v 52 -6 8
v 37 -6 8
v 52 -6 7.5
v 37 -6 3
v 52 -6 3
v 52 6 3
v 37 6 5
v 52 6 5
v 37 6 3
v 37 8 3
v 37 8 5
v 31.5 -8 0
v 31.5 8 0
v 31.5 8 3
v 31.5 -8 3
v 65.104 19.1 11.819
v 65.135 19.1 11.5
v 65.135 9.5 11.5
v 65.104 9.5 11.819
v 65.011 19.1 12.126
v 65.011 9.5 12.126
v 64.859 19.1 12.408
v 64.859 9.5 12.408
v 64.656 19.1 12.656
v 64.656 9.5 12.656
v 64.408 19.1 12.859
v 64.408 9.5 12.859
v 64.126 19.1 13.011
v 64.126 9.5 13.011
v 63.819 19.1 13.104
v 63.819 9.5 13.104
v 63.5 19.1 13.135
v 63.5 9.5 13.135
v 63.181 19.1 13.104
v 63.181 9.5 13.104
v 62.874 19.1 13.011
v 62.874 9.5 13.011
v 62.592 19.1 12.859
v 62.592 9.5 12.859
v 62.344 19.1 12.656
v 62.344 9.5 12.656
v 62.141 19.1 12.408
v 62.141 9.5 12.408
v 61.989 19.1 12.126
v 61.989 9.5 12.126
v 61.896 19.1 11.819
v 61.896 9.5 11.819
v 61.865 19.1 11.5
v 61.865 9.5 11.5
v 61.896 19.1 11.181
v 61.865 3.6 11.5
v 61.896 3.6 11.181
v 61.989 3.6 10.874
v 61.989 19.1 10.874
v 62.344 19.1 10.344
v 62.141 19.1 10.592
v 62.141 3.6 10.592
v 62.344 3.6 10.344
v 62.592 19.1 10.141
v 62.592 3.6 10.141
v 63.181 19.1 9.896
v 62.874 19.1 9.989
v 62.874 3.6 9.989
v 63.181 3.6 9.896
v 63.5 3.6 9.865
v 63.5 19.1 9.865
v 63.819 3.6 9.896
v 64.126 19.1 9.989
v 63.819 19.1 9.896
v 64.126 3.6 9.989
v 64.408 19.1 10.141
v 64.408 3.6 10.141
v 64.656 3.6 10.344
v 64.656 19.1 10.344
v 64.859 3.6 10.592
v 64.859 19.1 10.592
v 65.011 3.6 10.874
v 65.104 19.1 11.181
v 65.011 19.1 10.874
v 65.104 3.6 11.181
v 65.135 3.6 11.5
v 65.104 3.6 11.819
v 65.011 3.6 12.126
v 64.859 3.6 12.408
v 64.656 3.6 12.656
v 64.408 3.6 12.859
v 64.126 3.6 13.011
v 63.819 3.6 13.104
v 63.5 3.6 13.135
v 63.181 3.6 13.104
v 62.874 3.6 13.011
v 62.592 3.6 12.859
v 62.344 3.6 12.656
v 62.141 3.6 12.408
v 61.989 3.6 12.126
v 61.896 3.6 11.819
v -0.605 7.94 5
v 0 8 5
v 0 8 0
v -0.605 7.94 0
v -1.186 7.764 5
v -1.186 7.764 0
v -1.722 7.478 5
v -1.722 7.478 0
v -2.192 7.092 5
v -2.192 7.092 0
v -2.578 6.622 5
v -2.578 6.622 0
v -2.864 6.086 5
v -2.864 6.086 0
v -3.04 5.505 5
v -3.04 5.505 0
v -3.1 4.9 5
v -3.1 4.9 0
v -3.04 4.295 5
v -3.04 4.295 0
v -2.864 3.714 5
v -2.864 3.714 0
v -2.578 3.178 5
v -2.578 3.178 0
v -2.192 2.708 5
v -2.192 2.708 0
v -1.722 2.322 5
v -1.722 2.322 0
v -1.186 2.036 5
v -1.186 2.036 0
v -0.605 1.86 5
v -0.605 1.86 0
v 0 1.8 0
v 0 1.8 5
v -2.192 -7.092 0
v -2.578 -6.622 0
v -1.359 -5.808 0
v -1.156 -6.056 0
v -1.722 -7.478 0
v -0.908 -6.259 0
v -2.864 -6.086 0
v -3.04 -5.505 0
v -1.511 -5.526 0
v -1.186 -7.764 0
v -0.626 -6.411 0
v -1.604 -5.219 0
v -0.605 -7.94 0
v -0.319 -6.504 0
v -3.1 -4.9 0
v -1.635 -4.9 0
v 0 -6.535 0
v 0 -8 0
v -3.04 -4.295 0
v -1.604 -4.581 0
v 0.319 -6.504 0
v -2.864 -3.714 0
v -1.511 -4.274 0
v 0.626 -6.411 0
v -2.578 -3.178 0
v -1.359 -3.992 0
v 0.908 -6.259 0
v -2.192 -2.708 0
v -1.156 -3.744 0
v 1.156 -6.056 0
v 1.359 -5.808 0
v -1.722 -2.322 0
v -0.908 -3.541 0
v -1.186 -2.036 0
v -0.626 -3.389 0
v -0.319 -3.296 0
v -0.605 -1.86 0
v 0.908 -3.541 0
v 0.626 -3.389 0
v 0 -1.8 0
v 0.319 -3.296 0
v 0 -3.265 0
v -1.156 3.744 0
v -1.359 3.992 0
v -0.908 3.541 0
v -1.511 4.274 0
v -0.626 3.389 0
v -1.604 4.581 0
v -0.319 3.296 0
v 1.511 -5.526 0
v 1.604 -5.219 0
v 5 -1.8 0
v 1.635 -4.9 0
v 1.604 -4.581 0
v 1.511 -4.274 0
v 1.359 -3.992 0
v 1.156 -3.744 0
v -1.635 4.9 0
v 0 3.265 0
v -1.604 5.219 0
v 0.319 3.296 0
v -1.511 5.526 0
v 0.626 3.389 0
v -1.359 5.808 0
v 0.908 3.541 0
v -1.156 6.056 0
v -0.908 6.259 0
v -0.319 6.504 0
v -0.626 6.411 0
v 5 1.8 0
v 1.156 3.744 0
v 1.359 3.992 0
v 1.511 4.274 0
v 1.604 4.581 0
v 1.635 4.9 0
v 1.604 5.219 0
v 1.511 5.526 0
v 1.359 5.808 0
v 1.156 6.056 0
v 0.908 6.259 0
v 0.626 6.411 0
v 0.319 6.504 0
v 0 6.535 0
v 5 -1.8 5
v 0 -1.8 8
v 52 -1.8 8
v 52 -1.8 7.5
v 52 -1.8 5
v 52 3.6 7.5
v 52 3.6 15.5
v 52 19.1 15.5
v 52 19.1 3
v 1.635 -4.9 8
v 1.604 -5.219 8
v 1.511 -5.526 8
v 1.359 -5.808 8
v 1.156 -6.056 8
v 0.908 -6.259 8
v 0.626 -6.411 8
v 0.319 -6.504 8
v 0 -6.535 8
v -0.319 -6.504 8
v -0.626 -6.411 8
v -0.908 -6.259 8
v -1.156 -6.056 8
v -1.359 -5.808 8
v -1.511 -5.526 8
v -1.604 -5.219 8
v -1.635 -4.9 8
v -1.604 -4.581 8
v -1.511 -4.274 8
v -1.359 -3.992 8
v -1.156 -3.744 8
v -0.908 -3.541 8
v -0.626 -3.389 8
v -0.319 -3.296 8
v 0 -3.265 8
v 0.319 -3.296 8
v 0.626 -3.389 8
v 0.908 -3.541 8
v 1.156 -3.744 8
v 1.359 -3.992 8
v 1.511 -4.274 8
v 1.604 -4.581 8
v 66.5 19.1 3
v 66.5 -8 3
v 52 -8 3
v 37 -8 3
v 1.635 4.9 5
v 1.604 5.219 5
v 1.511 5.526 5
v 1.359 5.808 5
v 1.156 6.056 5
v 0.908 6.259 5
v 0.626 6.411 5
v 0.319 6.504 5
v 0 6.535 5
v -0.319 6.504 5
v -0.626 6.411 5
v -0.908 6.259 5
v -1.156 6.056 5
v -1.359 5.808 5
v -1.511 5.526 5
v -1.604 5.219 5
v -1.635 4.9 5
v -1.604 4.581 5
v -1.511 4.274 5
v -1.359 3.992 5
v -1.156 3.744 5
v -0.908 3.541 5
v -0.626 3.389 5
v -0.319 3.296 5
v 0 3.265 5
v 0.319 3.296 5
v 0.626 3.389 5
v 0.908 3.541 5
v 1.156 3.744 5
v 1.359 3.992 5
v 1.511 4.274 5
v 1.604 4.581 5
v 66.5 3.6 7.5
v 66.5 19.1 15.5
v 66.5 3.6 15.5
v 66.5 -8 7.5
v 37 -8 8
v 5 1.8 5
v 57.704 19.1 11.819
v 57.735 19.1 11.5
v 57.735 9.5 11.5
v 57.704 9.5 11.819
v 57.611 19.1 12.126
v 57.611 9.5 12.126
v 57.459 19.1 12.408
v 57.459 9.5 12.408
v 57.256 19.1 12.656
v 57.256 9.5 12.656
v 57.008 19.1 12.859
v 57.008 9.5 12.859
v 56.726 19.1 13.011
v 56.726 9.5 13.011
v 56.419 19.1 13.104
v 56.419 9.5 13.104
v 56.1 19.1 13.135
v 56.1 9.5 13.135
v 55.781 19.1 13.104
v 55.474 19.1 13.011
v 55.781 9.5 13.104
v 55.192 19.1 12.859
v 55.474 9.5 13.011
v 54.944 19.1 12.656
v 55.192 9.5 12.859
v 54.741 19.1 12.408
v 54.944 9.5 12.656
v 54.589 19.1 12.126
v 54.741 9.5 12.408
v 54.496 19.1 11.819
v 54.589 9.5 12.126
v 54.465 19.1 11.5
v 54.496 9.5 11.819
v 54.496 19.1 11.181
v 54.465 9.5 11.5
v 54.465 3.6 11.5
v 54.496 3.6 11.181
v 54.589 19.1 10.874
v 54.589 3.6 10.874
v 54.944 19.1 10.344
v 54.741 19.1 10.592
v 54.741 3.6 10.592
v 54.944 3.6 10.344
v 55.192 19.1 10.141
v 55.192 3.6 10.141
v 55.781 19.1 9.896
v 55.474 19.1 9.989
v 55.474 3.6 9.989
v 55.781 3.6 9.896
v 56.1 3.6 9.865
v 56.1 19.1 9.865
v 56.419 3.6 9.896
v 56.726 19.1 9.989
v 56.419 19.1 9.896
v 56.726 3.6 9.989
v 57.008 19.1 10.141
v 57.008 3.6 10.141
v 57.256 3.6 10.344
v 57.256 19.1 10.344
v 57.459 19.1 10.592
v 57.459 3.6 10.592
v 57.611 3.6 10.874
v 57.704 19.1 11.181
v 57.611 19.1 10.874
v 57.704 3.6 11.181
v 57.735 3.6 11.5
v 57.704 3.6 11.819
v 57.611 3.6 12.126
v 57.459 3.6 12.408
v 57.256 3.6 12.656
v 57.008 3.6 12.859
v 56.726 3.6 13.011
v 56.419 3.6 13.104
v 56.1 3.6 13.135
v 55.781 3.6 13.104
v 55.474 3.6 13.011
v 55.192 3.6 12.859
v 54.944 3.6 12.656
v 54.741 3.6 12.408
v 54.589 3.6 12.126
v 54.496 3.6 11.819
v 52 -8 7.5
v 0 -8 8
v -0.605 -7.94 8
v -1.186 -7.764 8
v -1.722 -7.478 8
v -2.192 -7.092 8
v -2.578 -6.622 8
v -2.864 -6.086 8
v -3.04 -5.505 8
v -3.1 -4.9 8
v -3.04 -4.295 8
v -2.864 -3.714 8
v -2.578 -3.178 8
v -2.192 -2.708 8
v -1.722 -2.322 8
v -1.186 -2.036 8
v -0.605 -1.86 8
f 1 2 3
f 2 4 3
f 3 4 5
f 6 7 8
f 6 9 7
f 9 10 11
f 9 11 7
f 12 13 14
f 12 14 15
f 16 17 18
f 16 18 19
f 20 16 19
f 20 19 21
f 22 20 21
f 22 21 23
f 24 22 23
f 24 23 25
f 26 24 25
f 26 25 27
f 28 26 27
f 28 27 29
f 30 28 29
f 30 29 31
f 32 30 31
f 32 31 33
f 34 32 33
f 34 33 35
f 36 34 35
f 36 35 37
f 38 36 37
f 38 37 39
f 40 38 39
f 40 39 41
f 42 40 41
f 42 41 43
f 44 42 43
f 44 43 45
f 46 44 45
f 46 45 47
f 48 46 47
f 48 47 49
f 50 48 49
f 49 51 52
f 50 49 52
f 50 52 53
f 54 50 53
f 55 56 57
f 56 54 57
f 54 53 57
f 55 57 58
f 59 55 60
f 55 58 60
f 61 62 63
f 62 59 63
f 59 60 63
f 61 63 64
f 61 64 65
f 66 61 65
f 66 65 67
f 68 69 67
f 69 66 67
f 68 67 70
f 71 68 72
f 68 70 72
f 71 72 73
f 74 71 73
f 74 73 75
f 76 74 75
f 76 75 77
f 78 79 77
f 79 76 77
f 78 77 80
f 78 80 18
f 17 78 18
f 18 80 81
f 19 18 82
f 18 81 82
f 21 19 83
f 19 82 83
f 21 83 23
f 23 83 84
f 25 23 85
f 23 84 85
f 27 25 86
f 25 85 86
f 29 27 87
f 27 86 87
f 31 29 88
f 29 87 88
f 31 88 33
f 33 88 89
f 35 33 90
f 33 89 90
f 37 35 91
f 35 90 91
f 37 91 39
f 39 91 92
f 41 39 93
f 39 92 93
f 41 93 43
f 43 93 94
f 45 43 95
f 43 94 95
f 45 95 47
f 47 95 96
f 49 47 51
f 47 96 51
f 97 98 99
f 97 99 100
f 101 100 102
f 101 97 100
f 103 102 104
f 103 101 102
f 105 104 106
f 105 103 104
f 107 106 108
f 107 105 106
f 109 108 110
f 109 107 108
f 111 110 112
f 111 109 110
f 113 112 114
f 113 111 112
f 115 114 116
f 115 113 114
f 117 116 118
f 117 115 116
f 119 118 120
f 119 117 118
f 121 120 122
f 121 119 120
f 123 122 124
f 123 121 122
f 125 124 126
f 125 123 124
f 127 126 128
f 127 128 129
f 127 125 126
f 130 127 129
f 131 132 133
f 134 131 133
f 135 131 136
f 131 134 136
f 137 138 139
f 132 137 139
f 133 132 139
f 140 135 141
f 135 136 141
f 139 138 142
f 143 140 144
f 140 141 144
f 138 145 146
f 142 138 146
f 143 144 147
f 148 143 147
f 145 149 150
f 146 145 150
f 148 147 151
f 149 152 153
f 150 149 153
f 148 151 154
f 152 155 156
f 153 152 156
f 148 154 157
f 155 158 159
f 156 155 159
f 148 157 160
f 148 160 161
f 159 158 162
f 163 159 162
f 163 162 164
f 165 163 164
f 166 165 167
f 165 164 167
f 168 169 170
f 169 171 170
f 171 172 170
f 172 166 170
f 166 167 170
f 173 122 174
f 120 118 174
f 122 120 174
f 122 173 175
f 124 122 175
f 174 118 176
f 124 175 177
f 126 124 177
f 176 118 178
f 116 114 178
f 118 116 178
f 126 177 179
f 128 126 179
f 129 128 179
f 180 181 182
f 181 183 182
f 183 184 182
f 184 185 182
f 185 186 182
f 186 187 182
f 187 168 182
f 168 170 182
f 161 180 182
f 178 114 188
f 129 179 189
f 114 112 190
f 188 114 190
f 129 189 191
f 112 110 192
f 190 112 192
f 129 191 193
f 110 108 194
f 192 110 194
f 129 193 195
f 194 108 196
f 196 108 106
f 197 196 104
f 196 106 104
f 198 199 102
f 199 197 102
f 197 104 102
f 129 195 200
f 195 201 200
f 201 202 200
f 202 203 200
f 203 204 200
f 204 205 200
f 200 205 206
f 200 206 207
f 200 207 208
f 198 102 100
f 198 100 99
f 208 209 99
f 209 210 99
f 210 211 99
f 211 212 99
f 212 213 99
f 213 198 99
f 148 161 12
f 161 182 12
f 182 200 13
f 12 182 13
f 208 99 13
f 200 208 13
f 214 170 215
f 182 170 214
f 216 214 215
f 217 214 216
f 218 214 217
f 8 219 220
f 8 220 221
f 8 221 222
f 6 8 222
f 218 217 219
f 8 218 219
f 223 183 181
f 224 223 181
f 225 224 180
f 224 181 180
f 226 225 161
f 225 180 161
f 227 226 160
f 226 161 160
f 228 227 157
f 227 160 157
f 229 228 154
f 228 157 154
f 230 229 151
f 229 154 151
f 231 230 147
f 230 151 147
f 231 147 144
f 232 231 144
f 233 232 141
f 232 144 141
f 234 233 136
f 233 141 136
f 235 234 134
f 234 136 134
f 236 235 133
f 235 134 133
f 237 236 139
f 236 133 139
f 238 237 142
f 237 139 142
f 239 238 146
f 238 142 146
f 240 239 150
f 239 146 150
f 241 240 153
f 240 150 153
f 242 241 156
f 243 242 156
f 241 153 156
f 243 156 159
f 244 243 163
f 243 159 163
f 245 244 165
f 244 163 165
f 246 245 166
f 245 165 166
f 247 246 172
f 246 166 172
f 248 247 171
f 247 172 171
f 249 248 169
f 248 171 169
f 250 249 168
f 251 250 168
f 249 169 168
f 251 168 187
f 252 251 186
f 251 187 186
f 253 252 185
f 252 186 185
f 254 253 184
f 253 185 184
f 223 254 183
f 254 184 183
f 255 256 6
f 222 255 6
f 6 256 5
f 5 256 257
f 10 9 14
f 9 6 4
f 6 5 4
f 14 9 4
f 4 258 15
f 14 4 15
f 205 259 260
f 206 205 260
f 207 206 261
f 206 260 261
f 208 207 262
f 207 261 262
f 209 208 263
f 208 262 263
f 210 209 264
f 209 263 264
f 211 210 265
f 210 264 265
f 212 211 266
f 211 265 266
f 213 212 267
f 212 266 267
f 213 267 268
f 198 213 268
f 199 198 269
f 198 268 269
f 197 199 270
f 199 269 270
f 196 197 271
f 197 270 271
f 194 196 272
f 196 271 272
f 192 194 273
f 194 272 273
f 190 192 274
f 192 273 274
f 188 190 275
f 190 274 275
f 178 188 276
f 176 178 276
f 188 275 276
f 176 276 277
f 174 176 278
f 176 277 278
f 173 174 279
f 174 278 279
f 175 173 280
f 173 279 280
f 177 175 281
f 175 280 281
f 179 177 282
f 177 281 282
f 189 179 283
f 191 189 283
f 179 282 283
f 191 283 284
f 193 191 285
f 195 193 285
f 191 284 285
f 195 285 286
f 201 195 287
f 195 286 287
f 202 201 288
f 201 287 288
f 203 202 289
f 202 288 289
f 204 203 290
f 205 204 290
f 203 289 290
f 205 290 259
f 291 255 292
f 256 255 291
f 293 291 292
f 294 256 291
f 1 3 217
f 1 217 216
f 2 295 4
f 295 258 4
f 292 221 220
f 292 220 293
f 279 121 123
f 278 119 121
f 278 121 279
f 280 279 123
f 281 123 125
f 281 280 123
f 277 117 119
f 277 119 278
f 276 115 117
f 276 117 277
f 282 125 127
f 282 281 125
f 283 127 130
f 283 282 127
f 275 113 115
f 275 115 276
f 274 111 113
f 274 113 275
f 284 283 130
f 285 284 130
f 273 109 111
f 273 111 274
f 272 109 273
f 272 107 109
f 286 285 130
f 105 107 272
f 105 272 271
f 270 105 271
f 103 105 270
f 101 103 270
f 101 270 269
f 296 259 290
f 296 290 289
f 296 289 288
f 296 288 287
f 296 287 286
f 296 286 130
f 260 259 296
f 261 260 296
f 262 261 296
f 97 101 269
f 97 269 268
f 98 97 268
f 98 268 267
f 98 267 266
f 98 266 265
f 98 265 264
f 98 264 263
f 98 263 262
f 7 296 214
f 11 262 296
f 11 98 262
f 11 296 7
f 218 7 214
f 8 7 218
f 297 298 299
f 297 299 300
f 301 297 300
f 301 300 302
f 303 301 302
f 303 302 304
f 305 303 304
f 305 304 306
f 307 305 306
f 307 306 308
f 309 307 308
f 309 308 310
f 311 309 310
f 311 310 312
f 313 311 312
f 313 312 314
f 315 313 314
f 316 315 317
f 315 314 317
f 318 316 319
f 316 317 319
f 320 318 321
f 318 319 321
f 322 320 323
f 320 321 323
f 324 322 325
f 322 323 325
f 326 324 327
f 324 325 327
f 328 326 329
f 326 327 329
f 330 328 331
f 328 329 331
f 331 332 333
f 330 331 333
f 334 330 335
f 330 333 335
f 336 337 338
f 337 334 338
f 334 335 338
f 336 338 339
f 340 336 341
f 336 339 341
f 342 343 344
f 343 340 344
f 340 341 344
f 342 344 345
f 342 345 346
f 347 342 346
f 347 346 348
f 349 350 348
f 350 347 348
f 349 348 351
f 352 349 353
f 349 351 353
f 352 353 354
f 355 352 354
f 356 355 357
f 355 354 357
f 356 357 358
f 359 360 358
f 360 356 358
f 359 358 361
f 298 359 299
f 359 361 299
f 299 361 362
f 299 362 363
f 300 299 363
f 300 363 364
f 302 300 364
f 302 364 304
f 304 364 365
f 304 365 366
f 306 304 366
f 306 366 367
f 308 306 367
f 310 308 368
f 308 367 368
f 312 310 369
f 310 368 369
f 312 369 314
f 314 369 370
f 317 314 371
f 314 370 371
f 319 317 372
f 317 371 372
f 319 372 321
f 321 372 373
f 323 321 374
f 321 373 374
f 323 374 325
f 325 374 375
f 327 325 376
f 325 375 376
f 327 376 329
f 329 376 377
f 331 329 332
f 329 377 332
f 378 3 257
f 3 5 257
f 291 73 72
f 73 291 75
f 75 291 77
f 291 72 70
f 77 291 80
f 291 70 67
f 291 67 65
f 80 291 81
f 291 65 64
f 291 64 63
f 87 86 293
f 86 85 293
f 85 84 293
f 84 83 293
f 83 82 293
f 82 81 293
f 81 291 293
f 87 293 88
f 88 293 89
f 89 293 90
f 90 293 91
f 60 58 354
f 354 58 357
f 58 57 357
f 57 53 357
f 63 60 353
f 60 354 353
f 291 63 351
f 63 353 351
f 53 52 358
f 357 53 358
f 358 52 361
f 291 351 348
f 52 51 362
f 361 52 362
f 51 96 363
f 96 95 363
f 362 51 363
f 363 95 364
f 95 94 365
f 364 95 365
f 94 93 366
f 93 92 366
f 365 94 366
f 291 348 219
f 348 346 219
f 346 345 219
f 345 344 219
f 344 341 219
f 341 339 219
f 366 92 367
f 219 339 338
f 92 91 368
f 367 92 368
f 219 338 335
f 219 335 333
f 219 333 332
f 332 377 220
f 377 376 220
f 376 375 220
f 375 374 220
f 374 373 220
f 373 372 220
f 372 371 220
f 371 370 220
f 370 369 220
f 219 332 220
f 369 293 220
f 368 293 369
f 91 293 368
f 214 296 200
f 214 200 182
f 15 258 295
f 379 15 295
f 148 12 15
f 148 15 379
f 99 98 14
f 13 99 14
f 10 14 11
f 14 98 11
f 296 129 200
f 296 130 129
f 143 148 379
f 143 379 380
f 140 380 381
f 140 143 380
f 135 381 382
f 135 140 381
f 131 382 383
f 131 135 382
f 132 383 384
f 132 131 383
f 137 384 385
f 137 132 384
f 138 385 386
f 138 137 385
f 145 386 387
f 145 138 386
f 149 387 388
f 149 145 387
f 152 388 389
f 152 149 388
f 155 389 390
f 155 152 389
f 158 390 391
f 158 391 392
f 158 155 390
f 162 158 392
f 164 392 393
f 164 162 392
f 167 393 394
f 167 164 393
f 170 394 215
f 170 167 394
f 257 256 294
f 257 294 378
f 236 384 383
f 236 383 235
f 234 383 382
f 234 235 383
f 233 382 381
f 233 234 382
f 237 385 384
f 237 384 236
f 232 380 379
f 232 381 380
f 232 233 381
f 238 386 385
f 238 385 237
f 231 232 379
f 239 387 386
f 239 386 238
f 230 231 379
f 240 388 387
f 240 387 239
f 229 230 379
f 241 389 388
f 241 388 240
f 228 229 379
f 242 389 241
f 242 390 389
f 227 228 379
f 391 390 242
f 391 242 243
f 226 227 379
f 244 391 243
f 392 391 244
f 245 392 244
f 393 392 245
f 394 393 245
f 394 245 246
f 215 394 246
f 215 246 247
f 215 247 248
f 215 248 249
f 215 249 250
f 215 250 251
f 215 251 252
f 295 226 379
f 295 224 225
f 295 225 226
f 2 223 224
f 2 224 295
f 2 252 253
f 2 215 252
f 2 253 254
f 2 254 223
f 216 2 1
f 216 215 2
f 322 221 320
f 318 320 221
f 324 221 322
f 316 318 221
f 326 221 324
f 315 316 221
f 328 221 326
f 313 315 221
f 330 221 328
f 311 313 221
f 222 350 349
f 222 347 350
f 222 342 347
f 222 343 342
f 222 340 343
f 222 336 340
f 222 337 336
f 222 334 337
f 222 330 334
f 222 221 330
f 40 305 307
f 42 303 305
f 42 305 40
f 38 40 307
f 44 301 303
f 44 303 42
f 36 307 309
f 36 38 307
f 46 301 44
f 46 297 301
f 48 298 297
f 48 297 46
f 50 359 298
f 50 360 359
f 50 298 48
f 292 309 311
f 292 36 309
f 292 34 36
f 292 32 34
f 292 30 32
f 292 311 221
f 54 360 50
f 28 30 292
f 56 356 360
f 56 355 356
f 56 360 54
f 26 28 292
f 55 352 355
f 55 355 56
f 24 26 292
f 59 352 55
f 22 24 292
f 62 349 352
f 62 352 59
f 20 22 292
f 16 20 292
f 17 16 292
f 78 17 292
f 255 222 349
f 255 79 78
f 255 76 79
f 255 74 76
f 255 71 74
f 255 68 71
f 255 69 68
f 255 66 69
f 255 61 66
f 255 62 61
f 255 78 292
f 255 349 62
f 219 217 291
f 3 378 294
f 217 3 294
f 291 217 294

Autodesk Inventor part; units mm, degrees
ref_plane "YZ Plane" through (0, 0, 0) normal (1, 0, 0) x (0, 1, 0)
ref_plane "XZ Plane" through (0, 0, 0) normal (0, 1, 0) x (-1, 0, 0)
sketch "スケッチ1" plane through (0, 0, 0) normal (0, 0, 1) x (1, 0, 0)
  line L0 (-3, 8) -> (3, 8)
  line L1 (3, 8) -> (3, -8)
  line L2 (3, -8) -> (-3, -8)
  line L3 (-3, -8) -> (-3, 8)
  line L4 (-3, 8) -> (3, -8) construction
  line L5 (3, 8) -> (-3, -8) construction
  line L6 (0, 8) -> (0, -8) construction
  circle A0 centre (0, 4.9) radius 1.635
  circle A1 centre (0, -4.9) radius 1.635
  line L7 (0, 4.9) -> (0, -4.9)
  line L8 (-3, 0) -> (3, 0)
  circle A2 centre (0, 4.9) radius 3.1
  circle A3 centre (0, -4.9) radius 3.1
  line L9 (3, 8) -> (52, 8)
  line L10 (52, 8) -> (52, -8)
  line L11 (52, -8) -> (3, -8)
  line L12 (0, 1.8) -> (52, 1.8)
  line L13 (0, -1.8) -> (52, -1.8)
  line L14 (5, 8) -> (5, -8)
  point P0 (0, 0)
  point P1 (0, 0)
  point P2 (3, 1.8)
  point P3 (3, -1.8)
  dimension "d0" = 3.27
  dimension "d1" = 16
  dimension "d2" = 9.8
  dimension "d3" = 6
  dimension "d11" = 2
  dimension "d12" = 47
extrude "押し出し1" add sketch "スケッチ1" along normal blind 8 contours A3 L1 L3 | L3 A3 | A3 L1
ref_plane "作業平面1" through (0, 0, 5) normal (0, 0, -1) x (-1, 0, 0)
extrude "押し出し2" add sketch "スケッチ1" against normal blind 5 from surface at 5 contours A2 L1 L3 | L3 A2 | A2 L1
extrude "押し出し3" add sketch "スケッチ1" along normal up to surface (5 mm away) contours L9 L10 L12 L14 | L12 L10 L13 L14 | L13 L10 L11 L14
extrude "押し出し4" add sketch "スケッチ1" against normal up to surface (5 mm away) from surface at 5 contours L0 L1 A2 | L9 L14 L12 L1 A2 | L9 L10 L12 L14 | L1 L12 A2
extrude "押し出し5" add sketch "スケッチ1" along normal up to surface (8 mm away) contours L14 L11 L1 A3 L13 | L13 L10 L11 L14 | L13 L1 A3 | A3 L1 L2
sketch "スケッチ2" plane through (0, 0, 0) normal (0, 1, 0) x (-1, 0, 0)
  line L0 (-52, 0) -> (-52, 5) construction
  line L1 (-52, 23) -> (-66.5, 23)
  line L2 (-66.5, 23) -> (-66.5, 0)
  line L3 (-66.5, 0) -> (-52, 0)
  line L4 (-52, 0) -> (-52, 23)
  line L5 (-66.5, 11.5) -> (-52, 11.5) construction
  line L6 (-52, 17) -> (-66.5, 17)
  line L7 (-66.5, 17) -> (-66.5, 6)
  line L8 (-66.5, 6) -> (-52, 6)
  line L9 (-52, 6) -> (-52, 17)
  line L10 (-52, 17) -> (-66.5, 6) construction
  line L11 (-66.5, 17) -> (-52, 6) construction
  circle A0 centre (-56.1, 11.5) radius 1.635
  circle A1 centre (-63.5, 11.5) radius 1.635
  line L12 (-52, 15) -> (-66.5, 15) construction
  line L13 (-52, 0) -> (-5, 0) construction
  line L14 (-52, 0) -> (-52, 5) construction
  line L15 (0, 8) -> (-52, 8) construction
  line L16 (-52, 7.5) -> (-66.5, 7.5)
  line L17 (-53.1, 6) -> (-53.1, 17)
  line L18 (-59.25, 0) -> (-59.25, 23) construction
  line L19 (-52, 15.5) -> (-66.5, 15.5)
  line L20 (-65.4, 6) -> (-65.4, 17)
  line L21 (-53.1, 7.5) -> (-53.1, 15.5)
  point P0 (-59.25, 11.5)
  point P1 (-66.5, 17)
  point P2 (-65.4, 15.5)
  point P3 (-65.4, 7.5)
  point P4 (-66.5, 15.5)
  point P5 (-66.5, 7.5)
  point P6 (-52, 7.5)
  point P7 (-52, 15.5)
  dimension "d24" = 11
  dimension "d25" = 3.27
  dimension "d26" = 4.1
  dimension "d27" = 11.5
  dimension "d32" = 3.5
  dimension "d33" = 14.5
  dimension "d36" = 3.5
  dimension "d37" = 3
  dimension "d38" = 4
extrude "押し出し7" add sketch "スケッチ2" along normal blind 30 from surface at -8
extrude "押し出し8" cut sketch "スケッチ2" against normal blind 12.5 from surface at 22 contours L4 L6 L2 L1 | L4 L19 L17 L6 | L6 L20 L19 L2 | L4 L16 L17 L19 | L17 L19 L20 L6 | L19 L20 L16 L2 | L4 L8 L17 L16 | L17 L16 L20 L19 | L16 L20 L8 L2 | L4 L3 L2 L8 | L17 L8 L20 L16 | A0 | A1
extrude "押し出し10" cut sketch "スケッチ2" along normal blind 11.6 from surface at -8 contours L4 L6 L2 L1 | L4 L19 L17 L6 | L6 L20 L19 L2 | L4 L16 L17 L19 | L17 L19 L20 L6 | L19 L20 L16 L2 | L17 L16 L20 L19
sketch "スケッチ4" plane through (0, 0, 0) normal (0, 0, -1) x (-1, 0, 0)
  circle A0 centre (0, 4.9) radius 1.635 projected
  circle A1 centre (0, -4.9) radius 1.635 projected
  line L0 (-52, 8) -> (-52, 9.5) projected
  line L1 (-52, 9.5) -> (-66.5, 9.5) projected
  line L2 (-66.5, -8) -> (-66.5, 9.5) projected
  line L3 (0, -8) -> (-66.5, -8) projected
  arc A2 (0, -8) -> (0, -1.8) centre (0, -4.9) ccw projected
  line L4 (-5, -1.8) -> (0, -1.8) projected
  line L5 (-5, 1.8) -> (-5, -1.8) projected
  line L6 (0, 1.8) -> (-5, 1.8) projected
  arc A3 (0, 1.8) -> (0, 8) centre (0, 4.9) ccw projected
  line L7 (-52, 8) -> (0, 8) projected
  line L8 (-52, 8) -> (-66.5, 8)
  line L9 (0, 0) -> (-66.5, 0) construction
  line L10 (-66.5, 8) -> (-31.5, 8)
  line L11 (-31.5, 8) -> (-31.5, -15)
  line L12 (-31.5, -15) -> (-66.5, -15)
  line L13 (-66.5, -15) -> (-66.5, 8)
  line L14 (-52, 8) -> (-37, 8)
  line L15 (-37, 8) -> (-37, 6)
  line L16 (-37, 6) -> (-52, 6)
  line L17 (-52, 6) -> (-52, 8)
  line L18 (-37, -8) -> (-37, -6)
  line L19 (-37, -6) -> (-52, -6)
  line L20 (-52, -6) -> (-52, -8)
  point P0 (-31.5, 8)
  point P1 (-37, 8)
  point P2 (-52, -8)
  point P3 (-37, -8)
  dimension "d41" = 35
  dimension "d42" = 23
  dimension "d43" = 15
  dimension "d44" = 2
extrude "押し出し11" cut sketch "スケッチ4" against normal blind 3 contours L8 L2 L1 L0 | L17 L16 L15 L7 L11 L3 L18 L19 L20 L2 L8 | L7 L15 L16 L17 | L3 L11 L12 L13 | L20 L19 L18 L3
extrude "押し出し12" cut sketch "スケッチ4" against normal up to surface (8 mm away) contours L7 L15 L16 L17 | L20 L19 L18 L3
sketch "スケッチ5" plane through (52, 9.5, 23) normal (0, 1, 0) x (1, 0, 0)
  circle A0 centre (11.5, 11.5) radius 1.635 projected
  circle A1 centre (4.1, 11.5) radius 1.635 projected
  line L0 (14.5, 20) -> (0, 20) projected
  line L1 (0, 0) -> (0, 20) projected
  line L2 (14.5, 0) -> (0, 0) projected
  line L3 (14.5, 20) -> (14.5, 0) projected
  point P0 (-52, 23)
extrude "押し出し13" add sketch "スケッチ5" along normal blind 9.6
extrude "押し出し14" cut sketch "スケッチ2" along normal through all contours L4 L6 L2 L1 | L4 L19 L17 L6 | L6 L20 L19 L2 | L17 L19 L20 L6
properties part number "link_arm_5"
